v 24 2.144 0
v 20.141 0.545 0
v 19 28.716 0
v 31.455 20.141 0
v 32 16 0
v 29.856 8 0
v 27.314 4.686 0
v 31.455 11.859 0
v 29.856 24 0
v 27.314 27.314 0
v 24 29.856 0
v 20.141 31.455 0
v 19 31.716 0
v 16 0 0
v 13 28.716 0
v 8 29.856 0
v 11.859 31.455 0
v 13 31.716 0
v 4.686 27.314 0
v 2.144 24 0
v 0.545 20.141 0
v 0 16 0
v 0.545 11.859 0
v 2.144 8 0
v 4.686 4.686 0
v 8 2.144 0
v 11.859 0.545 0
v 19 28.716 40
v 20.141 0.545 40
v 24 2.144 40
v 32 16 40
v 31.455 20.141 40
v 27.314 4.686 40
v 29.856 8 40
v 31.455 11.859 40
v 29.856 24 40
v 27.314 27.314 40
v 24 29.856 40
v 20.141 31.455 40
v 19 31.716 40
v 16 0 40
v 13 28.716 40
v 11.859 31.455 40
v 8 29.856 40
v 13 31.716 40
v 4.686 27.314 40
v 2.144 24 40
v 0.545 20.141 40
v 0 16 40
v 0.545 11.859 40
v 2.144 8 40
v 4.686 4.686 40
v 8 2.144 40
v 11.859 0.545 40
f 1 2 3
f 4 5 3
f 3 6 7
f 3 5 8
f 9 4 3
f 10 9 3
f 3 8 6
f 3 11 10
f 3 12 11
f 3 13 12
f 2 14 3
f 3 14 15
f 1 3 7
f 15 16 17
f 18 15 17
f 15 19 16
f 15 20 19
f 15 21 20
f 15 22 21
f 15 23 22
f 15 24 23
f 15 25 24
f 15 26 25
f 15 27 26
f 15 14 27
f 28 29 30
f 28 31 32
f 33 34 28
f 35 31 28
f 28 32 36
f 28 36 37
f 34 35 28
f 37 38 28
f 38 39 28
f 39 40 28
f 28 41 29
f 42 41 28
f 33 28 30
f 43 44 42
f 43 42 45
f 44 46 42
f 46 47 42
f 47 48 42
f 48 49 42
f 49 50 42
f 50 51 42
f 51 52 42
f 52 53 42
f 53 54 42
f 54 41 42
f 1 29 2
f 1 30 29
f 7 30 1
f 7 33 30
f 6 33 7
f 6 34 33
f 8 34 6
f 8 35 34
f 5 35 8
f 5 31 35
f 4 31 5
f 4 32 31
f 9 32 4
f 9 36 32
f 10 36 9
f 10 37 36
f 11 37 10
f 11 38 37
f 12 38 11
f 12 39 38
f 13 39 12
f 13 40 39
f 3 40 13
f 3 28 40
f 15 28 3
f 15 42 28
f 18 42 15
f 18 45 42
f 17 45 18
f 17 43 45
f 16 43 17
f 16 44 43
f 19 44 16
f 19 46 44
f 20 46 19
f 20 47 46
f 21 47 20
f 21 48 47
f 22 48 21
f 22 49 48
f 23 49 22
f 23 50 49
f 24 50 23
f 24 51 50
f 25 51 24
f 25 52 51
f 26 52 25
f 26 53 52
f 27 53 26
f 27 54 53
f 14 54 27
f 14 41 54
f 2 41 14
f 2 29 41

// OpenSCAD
$fn = 32;

// ----------------------------------------------------------------------
// Keyway shaft: d32 shaft, key 6 x 3 mm
// ----------------------------------------------------------------------

// --- parameters (mm) ---
shaft_r = 16;             // shaft radius
key_w = 6;                // keyway width
key_d = 3;                // keyway depth below the surface line
plate_t = 40;             // shaft length, Z (extrusion height)
fit_tol = 0.05;           // declared fit tolerance (prompt contract)
free_tol = 0.3;           // declared free tolerance (prompt contract)

shaft_d = 2 * shaft_r;  // shaft diameter
circle_step = 15;  // polygon sampling step, degrees

profile = [[11.859, 31.455], [8, 29.856], [4.686, 27.314], [2.144, 24], [0.545, 20.141], [0, 16], [0.545, 11.859], [2.144, 8], [4.686, 4.686], [8, 2.144], [11.859, 0.545], [16, 0], [20.141, 0.545], [24, 2.144], [27.314, 4.686], [29.856, 8], [31.455, 11.859], [32, 16], [31.455, 20.141], [29.856, 24], [27.314, 27.314], [24, 29.856], [20.141, 31.455], [19, 31.716], [19, 28.716], [13, 28.716], [13, 31.716]];  // primary outline, 27 points, counter clockwise

// --- the one profile operation ---
linear_extrude(height = plate_t) polygon(points = profile);
